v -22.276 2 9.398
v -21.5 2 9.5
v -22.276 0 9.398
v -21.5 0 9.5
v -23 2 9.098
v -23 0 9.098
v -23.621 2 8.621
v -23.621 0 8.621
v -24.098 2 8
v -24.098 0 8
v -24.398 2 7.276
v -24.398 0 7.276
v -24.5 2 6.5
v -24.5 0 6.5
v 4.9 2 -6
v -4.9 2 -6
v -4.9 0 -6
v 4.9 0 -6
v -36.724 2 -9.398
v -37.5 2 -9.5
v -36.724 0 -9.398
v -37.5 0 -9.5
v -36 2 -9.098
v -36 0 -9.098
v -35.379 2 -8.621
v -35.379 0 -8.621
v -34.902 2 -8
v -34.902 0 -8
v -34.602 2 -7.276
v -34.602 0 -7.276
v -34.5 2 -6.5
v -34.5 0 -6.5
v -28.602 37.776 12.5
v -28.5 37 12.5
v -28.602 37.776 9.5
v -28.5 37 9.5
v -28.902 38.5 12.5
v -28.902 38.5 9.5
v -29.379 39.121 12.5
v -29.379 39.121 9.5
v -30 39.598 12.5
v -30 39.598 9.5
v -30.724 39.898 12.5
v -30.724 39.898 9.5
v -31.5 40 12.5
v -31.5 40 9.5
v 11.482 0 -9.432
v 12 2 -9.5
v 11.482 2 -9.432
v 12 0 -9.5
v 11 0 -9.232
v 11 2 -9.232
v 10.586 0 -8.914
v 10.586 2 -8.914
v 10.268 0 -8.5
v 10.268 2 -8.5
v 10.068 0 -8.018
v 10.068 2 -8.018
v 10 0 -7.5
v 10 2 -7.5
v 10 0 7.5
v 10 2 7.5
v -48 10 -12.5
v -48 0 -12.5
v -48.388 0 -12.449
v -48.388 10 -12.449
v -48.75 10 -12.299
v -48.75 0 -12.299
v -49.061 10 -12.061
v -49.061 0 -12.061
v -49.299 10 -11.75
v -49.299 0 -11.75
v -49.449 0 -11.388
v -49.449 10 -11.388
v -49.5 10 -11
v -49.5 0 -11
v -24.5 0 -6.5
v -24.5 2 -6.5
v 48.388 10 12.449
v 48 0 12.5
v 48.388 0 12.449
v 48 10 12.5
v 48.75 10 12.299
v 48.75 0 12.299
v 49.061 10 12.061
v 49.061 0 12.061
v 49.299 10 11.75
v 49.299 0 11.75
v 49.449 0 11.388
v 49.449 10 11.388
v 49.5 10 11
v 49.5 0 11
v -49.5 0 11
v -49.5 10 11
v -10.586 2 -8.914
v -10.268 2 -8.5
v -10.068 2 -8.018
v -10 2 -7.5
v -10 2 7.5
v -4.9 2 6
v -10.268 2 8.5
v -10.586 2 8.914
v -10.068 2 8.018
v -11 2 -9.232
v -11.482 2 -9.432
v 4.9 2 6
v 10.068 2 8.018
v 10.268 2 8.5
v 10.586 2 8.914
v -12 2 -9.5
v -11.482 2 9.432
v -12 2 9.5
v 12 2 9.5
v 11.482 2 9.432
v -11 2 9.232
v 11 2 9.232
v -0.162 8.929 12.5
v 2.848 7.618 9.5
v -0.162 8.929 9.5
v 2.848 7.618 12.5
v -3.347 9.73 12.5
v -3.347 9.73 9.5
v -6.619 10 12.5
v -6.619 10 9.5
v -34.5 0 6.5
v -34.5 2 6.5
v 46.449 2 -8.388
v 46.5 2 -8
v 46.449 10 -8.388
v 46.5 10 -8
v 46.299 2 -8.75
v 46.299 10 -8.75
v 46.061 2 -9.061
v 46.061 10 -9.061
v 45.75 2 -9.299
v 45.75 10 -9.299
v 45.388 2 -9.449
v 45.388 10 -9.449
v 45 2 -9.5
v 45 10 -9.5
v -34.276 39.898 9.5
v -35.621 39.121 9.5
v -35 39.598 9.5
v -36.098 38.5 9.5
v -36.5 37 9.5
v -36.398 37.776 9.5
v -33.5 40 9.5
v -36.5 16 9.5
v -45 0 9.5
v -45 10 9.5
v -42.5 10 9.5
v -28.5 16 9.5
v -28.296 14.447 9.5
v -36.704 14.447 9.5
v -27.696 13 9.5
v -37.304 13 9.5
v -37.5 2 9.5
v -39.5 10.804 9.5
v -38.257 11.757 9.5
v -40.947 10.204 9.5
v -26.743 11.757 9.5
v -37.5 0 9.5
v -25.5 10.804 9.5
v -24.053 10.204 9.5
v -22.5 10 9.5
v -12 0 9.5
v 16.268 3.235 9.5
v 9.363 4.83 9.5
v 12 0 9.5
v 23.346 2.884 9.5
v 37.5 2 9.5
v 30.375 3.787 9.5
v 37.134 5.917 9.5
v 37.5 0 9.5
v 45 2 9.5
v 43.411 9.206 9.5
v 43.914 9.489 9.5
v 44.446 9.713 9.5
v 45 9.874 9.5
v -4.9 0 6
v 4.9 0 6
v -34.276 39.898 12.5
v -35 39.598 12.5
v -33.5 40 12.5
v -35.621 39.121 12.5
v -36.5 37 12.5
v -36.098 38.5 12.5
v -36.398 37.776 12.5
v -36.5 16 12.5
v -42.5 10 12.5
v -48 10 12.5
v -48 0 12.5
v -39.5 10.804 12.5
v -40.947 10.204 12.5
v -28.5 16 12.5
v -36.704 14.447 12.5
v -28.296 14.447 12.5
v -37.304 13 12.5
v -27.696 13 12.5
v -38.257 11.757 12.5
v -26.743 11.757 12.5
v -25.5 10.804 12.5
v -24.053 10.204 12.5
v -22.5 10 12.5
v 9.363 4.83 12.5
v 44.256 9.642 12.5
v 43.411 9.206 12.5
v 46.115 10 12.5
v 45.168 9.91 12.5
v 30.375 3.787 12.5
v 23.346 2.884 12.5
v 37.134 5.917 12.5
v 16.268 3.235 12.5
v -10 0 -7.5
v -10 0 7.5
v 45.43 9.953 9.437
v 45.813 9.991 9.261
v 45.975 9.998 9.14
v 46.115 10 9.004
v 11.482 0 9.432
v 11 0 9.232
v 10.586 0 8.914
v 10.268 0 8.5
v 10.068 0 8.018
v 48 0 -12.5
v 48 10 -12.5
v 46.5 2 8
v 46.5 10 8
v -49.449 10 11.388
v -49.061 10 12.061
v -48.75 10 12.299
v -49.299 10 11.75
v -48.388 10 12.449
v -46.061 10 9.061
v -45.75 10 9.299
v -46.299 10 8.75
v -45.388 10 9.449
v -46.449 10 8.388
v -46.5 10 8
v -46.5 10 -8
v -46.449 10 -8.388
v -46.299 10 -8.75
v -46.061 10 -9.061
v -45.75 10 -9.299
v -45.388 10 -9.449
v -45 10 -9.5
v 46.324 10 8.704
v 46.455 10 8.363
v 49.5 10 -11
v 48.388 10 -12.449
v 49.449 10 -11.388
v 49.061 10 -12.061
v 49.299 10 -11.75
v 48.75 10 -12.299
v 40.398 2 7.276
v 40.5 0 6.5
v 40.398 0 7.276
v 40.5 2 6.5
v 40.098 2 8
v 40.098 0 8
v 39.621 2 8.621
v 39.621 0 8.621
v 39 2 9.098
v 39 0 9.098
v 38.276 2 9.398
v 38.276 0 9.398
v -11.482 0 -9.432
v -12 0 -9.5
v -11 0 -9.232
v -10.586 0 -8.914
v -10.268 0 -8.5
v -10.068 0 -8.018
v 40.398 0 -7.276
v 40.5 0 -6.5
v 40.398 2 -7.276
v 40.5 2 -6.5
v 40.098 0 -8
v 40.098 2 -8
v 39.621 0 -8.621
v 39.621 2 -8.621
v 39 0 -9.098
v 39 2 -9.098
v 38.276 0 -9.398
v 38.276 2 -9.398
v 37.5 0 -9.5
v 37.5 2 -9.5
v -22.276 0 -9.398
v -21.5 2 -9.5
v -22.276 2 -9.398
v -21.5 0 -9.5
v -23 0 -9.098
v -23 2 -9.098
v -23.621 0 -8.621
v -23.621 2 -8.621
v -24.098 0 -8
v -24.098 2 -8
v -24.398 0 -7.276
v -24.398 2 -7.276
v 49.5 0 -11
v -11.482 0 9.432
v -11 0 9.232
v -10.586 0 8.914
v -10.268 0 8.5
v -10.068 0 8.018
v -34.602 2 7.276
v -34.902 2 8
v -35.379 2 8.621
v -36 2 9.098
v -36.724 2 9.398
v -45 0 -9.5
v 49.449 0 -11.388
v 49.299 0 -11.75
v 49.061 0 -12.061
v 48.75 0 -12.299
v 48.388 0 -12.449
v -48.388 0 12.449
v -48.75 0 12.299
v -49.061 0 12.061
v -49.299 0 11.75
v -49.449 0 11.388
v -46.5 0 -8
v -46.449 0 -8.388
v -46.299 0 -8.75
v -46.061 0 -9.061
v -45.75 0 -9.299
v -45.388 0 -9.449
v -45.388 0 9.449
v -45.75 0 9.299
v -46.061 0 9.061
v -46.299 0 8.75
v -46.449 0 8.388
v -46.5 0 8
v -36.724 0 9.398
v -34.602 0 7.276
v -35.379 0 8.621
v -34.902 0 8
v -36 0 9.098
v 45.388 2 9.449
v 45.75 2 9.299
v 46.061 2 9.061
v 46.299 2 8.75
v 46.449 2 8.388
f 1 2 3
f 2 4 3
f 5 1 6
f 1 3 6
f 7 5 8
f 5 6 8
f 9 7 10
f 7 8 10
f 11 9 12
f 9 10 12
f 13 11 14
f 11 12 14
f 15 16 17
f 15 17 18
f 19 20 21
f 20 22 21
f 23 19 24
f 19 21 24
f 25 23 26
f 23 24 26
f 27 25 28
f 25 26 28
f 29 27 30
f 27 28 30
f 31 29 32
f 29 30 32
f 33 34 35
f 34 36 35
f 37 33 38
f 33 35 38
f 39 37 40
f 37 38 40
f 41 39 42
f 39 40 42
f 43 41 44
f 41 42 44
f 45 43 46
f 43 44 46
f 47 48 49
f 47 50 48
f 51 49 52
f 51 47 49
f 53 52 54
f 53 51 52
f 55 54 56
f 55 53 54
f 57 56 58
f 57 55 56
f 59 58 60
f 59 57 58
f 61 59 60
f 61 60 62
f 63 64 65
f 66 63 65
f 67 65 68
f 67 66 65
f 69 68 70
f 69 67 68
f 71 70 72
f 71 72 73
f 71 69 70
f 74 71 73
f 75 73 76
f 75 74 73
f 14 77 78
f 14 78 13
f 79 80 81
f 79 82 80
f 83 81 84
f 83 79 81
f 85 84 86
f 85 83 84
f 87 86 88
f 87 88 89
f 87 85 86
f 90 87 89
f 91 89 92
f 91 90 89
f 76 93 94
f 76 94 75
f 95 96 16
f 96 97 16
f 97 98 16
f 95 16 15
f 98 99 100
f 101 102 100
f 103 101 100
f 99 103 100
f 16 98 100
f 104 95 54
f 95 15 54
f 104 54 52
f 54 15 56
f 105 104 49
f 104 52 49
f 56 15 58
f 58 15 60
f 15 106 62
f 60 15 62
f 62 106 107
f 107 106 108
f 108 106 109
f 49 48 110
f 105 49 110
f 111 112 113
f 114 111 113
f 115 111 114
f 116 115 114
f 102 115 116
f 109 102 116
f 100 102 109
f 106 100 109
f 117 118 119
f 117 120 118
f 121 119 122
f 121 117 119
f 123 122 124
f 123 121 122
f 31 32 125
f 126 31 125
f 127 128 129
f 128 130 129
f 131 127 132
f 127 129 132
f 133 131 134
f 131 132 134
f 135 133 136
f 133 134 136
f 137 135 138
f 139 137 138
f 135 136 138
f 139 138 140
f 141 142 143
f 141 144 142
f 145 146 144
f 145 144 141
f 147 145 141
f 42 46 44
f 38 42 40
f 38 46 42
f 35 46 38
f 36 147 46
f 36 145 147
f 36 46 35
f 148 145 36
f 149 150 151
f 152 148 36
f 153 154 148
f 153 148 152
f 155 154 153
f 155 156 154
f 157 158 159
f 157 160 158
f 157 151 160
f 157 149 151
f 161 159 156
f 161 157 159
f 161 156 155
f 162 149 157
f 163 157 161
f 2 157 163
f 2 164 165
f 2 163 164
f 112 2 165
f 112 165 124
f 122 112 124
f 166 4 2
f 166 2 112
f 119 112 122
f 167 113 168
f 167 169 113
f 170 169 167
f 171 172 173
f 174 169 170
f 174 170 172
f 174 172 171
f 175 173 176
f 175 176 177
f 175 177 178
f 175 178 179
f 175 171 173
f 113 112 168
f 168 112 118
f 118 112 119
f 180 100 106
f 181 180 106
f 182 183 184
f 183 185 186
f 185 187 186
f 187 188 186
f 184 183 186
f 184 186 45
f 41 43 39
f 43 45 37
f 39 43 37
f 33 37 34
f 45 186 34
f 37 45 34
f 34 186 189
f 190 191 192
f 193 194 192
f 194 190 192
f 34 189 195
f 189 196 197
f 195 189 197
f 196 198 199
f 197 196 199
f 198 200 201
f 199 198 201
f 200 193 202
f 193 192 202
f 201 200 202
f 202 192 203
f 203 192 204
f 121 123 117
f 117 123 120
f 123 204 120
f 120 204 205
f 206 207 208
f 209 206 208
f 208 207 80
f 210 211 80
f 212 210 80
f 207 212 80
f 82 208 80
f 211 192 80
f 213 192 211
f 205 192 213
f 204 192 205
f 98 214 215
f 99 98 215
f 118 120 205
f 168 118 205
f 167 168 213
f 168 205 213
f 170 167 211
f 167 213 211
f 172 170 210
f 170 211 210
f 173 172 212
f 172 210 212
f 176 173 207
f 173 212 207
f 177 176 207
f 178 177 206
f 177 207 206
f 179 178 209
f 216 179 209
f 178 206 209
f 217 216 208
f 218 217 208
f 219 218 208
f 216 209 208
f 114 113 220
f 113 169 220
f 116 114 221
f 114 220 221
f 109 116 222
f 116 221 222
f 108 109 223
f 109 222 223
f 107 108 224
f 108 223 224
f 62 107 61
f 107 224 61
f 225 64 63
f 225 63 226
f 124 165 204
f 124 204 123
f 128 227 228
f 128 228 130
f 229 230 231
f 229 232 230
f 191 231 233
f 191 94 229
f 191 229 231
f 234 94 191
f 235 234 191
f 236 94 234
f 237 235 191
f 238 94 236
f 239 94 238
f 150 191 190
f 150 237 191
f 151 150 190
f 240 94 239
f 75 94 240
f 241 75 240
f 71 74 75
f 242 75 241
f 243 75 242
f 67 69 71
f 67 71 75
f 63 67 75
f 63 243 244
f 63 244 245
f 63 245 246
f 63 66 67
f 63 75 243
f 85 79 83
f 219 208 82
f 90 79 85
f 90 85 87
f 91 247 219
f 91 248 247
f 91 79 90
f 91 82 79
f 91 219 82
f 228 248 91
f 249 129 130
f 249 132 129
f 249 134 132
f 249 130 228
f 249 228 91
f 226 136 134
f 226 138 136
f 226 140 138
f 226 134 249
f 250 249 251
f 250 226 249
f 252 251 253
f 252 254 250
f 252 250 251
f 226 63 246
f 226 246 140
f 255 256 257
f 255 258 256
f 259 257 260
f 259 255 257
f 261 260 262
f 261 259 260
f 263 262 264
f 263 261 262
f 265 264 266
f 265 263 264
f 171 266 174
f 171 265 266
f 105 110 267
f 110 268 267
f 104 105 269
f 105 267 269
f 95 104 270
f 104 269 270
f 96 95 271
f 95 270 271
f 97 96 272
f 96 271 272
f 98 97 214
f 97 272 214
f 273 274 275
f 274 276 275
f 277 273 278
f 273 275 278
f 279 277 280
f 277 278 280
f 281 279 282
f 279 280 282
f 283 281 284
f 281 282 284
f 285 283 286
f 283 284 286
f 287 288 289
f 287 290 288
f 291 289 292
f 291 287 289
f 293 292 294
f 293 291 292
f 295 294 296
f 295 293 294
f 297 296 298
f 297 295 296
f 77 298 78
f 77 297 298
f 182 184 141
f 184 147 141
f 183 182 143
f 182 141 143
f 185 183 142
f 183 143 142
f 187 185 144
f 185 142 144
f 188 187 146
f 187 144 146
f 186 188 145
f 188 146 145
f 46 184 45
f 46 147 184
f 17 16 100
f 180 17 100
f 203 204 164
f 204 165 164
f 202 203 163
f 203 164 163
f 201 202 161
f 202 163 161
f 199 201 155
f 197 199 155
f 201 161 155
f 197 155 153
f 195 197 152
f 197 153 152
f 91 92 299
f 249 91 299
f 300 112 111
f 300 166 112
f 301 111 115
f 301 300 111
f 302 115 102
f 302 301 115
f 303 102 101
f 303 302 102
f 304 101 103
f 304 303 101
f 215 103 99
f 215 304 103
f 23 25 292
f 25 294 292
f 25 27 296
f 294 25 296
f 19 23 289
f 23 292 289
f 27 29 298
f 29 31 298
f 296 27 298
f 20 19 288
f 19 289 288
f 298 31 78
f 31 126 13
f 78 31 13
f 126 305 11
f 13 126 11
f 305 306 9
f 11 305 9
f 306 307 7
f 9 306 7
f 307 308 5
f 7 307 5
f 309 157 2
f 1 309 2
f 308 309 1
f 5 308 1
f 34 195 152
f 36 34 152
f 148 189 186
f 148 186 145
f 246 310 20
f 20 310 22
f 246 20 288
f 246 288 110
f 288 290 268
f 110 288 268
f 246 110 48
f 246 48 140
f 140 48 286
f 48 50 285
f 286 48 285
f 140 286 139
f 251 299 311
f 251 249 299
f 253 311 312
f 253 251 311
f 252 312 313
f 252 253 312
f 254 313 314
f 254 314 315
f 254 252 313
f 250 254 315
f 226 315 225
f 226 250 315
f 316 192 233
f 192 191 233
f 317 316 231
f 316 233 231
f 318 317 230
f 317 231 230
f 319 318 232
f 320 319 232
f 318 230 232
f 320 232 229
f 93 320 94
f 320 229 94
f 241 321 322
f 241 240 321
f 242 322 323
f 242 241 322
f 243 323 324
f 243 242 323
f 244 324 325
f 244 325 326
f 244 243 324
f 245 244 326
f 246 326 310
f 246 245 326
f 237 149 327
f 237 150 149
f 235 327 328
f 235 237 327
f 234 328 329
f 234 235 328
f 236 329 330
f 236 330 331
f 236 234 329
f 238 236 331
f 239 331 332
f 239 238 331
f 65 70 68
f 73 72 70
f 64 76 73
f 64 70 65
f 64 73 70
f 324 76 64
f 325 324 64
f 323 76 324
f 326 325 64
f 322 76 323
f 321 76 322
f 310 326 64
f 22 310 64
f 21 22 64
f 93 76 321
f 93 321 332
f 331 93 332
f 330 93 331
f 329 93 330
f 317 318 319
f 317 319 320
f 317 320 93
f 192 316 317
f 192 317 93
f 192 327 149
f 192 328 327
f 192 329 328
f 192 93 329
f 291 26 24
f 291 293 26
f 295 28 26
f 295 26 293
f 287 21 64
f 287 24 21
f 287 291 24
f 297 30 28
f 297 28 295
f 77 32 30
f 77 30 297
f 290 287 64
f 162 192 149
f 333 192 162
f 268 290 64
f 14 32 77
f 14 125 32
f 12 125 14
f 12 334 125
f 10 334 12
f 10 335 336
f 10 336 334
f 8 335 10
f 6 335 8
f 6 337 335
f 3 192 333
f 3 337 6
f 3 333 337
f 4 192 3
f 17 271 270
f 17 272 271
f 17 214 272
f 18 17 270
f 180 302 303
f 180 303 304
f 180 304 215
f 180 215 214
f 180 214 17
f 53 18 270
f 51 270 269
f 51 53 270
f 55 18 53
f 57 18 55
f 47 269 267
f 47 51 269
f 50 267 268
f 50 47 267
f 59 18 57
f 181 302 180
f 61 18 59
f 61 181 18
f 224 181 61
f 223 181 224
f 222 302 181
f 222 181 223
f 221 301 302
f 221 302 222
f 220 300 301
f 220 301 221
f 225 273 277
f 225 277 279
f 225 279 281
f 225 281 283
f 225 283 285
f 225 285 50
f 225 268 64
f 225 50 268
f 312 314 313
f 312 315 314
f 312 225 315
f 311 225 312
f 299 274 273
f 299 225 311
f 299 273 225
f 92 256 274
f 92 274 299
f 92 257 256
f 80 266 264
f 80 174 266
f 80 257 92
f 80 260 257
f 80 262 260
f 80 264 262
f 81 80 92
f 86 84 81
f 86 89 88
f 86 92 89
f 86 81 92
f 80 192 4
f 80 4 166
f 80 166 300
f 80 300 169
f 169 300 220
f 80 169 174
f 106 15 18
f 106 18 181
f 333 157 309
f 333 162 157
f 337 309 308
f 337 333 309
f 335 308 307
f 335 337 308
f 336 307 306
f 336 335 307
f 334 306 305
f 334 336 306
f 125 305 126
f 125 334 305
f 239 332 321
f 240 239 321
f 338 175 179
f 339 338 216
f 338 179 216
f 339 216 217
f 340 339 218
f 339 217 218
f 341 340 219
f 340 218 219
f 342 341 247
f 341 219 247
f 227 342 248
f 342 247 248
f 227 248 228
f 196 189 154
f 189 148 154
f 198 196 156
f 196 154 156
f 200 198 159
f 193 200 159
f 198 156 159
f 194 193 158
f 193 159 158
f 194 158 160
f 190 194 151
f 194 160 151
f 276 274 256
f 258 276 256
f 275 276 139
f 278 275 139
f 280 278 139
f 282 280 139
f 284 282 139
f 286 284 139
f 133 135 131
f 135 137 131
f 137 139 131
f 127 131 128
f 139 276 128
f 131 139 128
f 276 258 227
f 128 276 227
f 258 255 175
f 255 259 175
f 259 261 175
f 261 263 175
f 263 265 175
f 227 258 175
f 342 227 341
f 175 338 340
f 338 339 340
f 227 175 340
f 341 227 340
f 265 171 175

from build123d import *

# Parameters (mm, degrees)
SKETCH1_W               = 99
SKETCH1_H               = 25
SKETCH1_W_2             = 93
SKETCH1_H_2             = 19
BOSS_EXTRUDE1_DEPTH     = 10
SKETCH2_R               = 40
CUT_EXTRUDE1_DEPTH      = 8
SKETCH5_W               = 10
SKETCH5_H               = 25
BOSS_EXTRUDE5_DEPTH     = 2
SKETCH6_W               = 6
SKETCH6_H               = 19
BOSS_EXTRUDE6_DEPTH     = 2
SKETCH7_W               = 8
SKETCH7_H               = 3
BOSS_EXTRUDE7_DEPTH     = 30
FILLET5_R               = 3
FILLET7_R               = 5
FILLET8_R               = 20
FILLET9_R               = 1.5
FILLET10_R              = 6
FILLET11_R              = 3
SKETCH8_W               = 20
SKETCH8_H               = 25
BOSS_EXTRUDE8_DEPTH     = 2
SKETCH9_W               = 9.8
SKETCH9_H               = 12
BOSS_EXTRUDE9_DEPTH     = 10
SKETCH10_R              = 2
CUT_EXTRUDE2_DEPTH      = 23
FILLET12_R              = 6
CUT_EXTRUDE5_DEPTH      = 65.857536204
CUT_EXTRUDE5_DEPTH_BACK = 65.857536204
SKETCH12_W              = 9.8
SKETCH12_H              = 12
FILLET13_R              = 2


with BuildPart() as part:
    # Sketch1 → Boss-Extrude1 (new body)
    with BuildSketch(Plane(origin=(0, 0, 0), x_dir=(1, 0, 0), z_dir=(0, 1, 0))):
        Rectangle(SKETCH1_W, SKETCH1_H)
        Rectangle(SKETCH1_W_2, SKETCH1_H_2, mode=Mode.SUBTRACT)
    extrude(amount=BOSS_EXTRUDE1_DEPTH)

    # Sketch2 → Cut-Extrude1 (cut)
    with BuildSketch(Plane.XY.offset(12.5)):
        with Locations((21.780912994, 42.853113242)):
            Circle(SKETCH2_R)
    extrude(amount=-CUT_EXTRUDE1_DEPTH, mode=Mode.SUBTRACT)

    # Sketch5 → Boss-Extrude5 (add)
    with BuildSketch(Plane.XZ):
        with Locations((-29.5, 0)):
            Rectangle(SKETCH5_W, SKETCH5_H)
    extrude(amount=-BOSS_EXTRUDE5_DEPTH)

    # Sketch6 → Boss-Extrude6 (add)
    with BuildSketch(Plane.XZ):
        with Locations((43.5, 0)):
            Rectangle(SKETCH6_W, SKETCH6_H)
    extrude(amount=-BOSS_EXTRUDE6_DEPTH)

    # Sketch7 → Boss-Extrude7 (add)
    with BuildSketch(Plane(origin=(0, 10, 0), x_dir=(1, 0, 0), z_dir=(0, 1, 0))):
        with Locations((-32.5, -11)):
            Rectangle(SKETCH7_W, SKETCH7_H)
    extrude(amount=BOSS_EXTRUDE7_DEPTH)

    # Fillet5
    fillet5_edges = [part.edges().sort_by_distance(p)[0] for p in [
        (-34.5, 1, 9.5),
        (-24.5, 1, 9.5),
        (-24.5, 1, -9.5),
        (-34.5, 1, -9.5),
        (40.5, 1, -9.5),
        (40.5, 1, 9.5),
    ]]
    fillet(fillet5_edges, radius=FILLET5_R)

    # Fillet7
    fillet7_edges = [part.edges().sort_by_distance(p)[0] for p in [
        (44.599172136, 10, 11),
    ]]
    fillet(fillet7_edges, radius=FILLET7_R)

    # Fillet8
    fillet8_edges = [part.edges().sort_by_distance(p)[0] for p in [
        (-1.037346149, 10, 11),
    ]]
    fillet(fillet8_edges, radius=FILLET8_R)

    # Fillet9
    fillet9_edges = [part.edges().sort_by_distance(p)[0] for p in [
        (46.5, 6, 9.5),
        (46.5, 6, -9.5),
        (-46.5, 5, -9.5),
        (-46.5, 5, 9.5),
        (-49.5, 5, 12.5),
        (-49.5, 5, -12.5),
        (49.5, 5, -12.5),
        (49.5, 5, 12.5),
    ]]
    fillet(fillet9_edges, radius=FILLET9_R)

    # Fillet10
    fillet10_edges = [part.edges().sort_by_distance(p)[0] for p in [
        (-36.5, 10, 11),
        (-28.5, 10, 11),
    ]]
    fillet(fillet10_edges, radius=FILLET10_R)

    # Fillet11
    fillet11_edges = [part.edges().sort_by_distance(p)[0] for p in [
        (-36.5, 40, 11),
        (-28.5, 40, 11),
    ]]
    fillet(fillet11_edges, radius=FILLET11_R)

    # Sketch8 → Boss-Extrude8 (add)
    with BuildSketch(Plane.XZ):
        Rectangle(SKETCH8_W, SKETCH8_H)
    extrude(amount=-BOSS_EXTRUDE8_DEPTH)

    # Sketch9 → Boss-Extrude9 (add)
    with BuildSketch(Plane.XZ):
        Rectangle(SKETCH9_W, SKETCH9_H)
    extrude(amount=BOSS_EXTRUDE9_DEPTH)

    # Sketch10 → Cut-Extrude2 (cut)
    with BuildSketch(Plane(origin=(4.9, 0, 0), x_dir=(0, 0, -1), z_dir=(1, 0, 0))):
        with Locations((0, -5)):
            Circle(SKETCH10_R)
    extrude(amount=-CUT_EXTRUDE2_DEPTH, mode=Mode.SUBTRACT)

    # Fillet12
    fillet12_edges = [part.edges().sort_by_distance(p)[0] for p in [
        (0, -10, 6),
        (0, -10, -6),
    ]]
    fillet(fillet12_edges, radius=FILLET12_R - 0.0001)  # a hair under: the kernel refuses the full size

    # Sketch12 → Cut-Extrude5 (cut, two sides: drawn at the far end of the back side and taken through both)
    with BuildSketch(Plane.XZ.offset(-CUT_EXTRUDE5_DEPTH_BACK)):
        Rectangle(SKETCH12_W, SKETCH12_H)
    extrude(amount=CUT_EXTRUDE5_DEPTH + CUT_EXTRUDE5_DEPTH_BACK, mode=Mode.SUBTRACT)

    # Fillet13
    fillet13_edges = [part.edges().sort_by_distance(p)[0] for p in [
        (-10, 1, 9.5),
        (10, 1, 9.5),
        (10, 1, -9.5),
        (-10, 1, -9.5),
    ]]
    fillet(fillet13_edges, radius=FILLET13_R)


solid = part.part
